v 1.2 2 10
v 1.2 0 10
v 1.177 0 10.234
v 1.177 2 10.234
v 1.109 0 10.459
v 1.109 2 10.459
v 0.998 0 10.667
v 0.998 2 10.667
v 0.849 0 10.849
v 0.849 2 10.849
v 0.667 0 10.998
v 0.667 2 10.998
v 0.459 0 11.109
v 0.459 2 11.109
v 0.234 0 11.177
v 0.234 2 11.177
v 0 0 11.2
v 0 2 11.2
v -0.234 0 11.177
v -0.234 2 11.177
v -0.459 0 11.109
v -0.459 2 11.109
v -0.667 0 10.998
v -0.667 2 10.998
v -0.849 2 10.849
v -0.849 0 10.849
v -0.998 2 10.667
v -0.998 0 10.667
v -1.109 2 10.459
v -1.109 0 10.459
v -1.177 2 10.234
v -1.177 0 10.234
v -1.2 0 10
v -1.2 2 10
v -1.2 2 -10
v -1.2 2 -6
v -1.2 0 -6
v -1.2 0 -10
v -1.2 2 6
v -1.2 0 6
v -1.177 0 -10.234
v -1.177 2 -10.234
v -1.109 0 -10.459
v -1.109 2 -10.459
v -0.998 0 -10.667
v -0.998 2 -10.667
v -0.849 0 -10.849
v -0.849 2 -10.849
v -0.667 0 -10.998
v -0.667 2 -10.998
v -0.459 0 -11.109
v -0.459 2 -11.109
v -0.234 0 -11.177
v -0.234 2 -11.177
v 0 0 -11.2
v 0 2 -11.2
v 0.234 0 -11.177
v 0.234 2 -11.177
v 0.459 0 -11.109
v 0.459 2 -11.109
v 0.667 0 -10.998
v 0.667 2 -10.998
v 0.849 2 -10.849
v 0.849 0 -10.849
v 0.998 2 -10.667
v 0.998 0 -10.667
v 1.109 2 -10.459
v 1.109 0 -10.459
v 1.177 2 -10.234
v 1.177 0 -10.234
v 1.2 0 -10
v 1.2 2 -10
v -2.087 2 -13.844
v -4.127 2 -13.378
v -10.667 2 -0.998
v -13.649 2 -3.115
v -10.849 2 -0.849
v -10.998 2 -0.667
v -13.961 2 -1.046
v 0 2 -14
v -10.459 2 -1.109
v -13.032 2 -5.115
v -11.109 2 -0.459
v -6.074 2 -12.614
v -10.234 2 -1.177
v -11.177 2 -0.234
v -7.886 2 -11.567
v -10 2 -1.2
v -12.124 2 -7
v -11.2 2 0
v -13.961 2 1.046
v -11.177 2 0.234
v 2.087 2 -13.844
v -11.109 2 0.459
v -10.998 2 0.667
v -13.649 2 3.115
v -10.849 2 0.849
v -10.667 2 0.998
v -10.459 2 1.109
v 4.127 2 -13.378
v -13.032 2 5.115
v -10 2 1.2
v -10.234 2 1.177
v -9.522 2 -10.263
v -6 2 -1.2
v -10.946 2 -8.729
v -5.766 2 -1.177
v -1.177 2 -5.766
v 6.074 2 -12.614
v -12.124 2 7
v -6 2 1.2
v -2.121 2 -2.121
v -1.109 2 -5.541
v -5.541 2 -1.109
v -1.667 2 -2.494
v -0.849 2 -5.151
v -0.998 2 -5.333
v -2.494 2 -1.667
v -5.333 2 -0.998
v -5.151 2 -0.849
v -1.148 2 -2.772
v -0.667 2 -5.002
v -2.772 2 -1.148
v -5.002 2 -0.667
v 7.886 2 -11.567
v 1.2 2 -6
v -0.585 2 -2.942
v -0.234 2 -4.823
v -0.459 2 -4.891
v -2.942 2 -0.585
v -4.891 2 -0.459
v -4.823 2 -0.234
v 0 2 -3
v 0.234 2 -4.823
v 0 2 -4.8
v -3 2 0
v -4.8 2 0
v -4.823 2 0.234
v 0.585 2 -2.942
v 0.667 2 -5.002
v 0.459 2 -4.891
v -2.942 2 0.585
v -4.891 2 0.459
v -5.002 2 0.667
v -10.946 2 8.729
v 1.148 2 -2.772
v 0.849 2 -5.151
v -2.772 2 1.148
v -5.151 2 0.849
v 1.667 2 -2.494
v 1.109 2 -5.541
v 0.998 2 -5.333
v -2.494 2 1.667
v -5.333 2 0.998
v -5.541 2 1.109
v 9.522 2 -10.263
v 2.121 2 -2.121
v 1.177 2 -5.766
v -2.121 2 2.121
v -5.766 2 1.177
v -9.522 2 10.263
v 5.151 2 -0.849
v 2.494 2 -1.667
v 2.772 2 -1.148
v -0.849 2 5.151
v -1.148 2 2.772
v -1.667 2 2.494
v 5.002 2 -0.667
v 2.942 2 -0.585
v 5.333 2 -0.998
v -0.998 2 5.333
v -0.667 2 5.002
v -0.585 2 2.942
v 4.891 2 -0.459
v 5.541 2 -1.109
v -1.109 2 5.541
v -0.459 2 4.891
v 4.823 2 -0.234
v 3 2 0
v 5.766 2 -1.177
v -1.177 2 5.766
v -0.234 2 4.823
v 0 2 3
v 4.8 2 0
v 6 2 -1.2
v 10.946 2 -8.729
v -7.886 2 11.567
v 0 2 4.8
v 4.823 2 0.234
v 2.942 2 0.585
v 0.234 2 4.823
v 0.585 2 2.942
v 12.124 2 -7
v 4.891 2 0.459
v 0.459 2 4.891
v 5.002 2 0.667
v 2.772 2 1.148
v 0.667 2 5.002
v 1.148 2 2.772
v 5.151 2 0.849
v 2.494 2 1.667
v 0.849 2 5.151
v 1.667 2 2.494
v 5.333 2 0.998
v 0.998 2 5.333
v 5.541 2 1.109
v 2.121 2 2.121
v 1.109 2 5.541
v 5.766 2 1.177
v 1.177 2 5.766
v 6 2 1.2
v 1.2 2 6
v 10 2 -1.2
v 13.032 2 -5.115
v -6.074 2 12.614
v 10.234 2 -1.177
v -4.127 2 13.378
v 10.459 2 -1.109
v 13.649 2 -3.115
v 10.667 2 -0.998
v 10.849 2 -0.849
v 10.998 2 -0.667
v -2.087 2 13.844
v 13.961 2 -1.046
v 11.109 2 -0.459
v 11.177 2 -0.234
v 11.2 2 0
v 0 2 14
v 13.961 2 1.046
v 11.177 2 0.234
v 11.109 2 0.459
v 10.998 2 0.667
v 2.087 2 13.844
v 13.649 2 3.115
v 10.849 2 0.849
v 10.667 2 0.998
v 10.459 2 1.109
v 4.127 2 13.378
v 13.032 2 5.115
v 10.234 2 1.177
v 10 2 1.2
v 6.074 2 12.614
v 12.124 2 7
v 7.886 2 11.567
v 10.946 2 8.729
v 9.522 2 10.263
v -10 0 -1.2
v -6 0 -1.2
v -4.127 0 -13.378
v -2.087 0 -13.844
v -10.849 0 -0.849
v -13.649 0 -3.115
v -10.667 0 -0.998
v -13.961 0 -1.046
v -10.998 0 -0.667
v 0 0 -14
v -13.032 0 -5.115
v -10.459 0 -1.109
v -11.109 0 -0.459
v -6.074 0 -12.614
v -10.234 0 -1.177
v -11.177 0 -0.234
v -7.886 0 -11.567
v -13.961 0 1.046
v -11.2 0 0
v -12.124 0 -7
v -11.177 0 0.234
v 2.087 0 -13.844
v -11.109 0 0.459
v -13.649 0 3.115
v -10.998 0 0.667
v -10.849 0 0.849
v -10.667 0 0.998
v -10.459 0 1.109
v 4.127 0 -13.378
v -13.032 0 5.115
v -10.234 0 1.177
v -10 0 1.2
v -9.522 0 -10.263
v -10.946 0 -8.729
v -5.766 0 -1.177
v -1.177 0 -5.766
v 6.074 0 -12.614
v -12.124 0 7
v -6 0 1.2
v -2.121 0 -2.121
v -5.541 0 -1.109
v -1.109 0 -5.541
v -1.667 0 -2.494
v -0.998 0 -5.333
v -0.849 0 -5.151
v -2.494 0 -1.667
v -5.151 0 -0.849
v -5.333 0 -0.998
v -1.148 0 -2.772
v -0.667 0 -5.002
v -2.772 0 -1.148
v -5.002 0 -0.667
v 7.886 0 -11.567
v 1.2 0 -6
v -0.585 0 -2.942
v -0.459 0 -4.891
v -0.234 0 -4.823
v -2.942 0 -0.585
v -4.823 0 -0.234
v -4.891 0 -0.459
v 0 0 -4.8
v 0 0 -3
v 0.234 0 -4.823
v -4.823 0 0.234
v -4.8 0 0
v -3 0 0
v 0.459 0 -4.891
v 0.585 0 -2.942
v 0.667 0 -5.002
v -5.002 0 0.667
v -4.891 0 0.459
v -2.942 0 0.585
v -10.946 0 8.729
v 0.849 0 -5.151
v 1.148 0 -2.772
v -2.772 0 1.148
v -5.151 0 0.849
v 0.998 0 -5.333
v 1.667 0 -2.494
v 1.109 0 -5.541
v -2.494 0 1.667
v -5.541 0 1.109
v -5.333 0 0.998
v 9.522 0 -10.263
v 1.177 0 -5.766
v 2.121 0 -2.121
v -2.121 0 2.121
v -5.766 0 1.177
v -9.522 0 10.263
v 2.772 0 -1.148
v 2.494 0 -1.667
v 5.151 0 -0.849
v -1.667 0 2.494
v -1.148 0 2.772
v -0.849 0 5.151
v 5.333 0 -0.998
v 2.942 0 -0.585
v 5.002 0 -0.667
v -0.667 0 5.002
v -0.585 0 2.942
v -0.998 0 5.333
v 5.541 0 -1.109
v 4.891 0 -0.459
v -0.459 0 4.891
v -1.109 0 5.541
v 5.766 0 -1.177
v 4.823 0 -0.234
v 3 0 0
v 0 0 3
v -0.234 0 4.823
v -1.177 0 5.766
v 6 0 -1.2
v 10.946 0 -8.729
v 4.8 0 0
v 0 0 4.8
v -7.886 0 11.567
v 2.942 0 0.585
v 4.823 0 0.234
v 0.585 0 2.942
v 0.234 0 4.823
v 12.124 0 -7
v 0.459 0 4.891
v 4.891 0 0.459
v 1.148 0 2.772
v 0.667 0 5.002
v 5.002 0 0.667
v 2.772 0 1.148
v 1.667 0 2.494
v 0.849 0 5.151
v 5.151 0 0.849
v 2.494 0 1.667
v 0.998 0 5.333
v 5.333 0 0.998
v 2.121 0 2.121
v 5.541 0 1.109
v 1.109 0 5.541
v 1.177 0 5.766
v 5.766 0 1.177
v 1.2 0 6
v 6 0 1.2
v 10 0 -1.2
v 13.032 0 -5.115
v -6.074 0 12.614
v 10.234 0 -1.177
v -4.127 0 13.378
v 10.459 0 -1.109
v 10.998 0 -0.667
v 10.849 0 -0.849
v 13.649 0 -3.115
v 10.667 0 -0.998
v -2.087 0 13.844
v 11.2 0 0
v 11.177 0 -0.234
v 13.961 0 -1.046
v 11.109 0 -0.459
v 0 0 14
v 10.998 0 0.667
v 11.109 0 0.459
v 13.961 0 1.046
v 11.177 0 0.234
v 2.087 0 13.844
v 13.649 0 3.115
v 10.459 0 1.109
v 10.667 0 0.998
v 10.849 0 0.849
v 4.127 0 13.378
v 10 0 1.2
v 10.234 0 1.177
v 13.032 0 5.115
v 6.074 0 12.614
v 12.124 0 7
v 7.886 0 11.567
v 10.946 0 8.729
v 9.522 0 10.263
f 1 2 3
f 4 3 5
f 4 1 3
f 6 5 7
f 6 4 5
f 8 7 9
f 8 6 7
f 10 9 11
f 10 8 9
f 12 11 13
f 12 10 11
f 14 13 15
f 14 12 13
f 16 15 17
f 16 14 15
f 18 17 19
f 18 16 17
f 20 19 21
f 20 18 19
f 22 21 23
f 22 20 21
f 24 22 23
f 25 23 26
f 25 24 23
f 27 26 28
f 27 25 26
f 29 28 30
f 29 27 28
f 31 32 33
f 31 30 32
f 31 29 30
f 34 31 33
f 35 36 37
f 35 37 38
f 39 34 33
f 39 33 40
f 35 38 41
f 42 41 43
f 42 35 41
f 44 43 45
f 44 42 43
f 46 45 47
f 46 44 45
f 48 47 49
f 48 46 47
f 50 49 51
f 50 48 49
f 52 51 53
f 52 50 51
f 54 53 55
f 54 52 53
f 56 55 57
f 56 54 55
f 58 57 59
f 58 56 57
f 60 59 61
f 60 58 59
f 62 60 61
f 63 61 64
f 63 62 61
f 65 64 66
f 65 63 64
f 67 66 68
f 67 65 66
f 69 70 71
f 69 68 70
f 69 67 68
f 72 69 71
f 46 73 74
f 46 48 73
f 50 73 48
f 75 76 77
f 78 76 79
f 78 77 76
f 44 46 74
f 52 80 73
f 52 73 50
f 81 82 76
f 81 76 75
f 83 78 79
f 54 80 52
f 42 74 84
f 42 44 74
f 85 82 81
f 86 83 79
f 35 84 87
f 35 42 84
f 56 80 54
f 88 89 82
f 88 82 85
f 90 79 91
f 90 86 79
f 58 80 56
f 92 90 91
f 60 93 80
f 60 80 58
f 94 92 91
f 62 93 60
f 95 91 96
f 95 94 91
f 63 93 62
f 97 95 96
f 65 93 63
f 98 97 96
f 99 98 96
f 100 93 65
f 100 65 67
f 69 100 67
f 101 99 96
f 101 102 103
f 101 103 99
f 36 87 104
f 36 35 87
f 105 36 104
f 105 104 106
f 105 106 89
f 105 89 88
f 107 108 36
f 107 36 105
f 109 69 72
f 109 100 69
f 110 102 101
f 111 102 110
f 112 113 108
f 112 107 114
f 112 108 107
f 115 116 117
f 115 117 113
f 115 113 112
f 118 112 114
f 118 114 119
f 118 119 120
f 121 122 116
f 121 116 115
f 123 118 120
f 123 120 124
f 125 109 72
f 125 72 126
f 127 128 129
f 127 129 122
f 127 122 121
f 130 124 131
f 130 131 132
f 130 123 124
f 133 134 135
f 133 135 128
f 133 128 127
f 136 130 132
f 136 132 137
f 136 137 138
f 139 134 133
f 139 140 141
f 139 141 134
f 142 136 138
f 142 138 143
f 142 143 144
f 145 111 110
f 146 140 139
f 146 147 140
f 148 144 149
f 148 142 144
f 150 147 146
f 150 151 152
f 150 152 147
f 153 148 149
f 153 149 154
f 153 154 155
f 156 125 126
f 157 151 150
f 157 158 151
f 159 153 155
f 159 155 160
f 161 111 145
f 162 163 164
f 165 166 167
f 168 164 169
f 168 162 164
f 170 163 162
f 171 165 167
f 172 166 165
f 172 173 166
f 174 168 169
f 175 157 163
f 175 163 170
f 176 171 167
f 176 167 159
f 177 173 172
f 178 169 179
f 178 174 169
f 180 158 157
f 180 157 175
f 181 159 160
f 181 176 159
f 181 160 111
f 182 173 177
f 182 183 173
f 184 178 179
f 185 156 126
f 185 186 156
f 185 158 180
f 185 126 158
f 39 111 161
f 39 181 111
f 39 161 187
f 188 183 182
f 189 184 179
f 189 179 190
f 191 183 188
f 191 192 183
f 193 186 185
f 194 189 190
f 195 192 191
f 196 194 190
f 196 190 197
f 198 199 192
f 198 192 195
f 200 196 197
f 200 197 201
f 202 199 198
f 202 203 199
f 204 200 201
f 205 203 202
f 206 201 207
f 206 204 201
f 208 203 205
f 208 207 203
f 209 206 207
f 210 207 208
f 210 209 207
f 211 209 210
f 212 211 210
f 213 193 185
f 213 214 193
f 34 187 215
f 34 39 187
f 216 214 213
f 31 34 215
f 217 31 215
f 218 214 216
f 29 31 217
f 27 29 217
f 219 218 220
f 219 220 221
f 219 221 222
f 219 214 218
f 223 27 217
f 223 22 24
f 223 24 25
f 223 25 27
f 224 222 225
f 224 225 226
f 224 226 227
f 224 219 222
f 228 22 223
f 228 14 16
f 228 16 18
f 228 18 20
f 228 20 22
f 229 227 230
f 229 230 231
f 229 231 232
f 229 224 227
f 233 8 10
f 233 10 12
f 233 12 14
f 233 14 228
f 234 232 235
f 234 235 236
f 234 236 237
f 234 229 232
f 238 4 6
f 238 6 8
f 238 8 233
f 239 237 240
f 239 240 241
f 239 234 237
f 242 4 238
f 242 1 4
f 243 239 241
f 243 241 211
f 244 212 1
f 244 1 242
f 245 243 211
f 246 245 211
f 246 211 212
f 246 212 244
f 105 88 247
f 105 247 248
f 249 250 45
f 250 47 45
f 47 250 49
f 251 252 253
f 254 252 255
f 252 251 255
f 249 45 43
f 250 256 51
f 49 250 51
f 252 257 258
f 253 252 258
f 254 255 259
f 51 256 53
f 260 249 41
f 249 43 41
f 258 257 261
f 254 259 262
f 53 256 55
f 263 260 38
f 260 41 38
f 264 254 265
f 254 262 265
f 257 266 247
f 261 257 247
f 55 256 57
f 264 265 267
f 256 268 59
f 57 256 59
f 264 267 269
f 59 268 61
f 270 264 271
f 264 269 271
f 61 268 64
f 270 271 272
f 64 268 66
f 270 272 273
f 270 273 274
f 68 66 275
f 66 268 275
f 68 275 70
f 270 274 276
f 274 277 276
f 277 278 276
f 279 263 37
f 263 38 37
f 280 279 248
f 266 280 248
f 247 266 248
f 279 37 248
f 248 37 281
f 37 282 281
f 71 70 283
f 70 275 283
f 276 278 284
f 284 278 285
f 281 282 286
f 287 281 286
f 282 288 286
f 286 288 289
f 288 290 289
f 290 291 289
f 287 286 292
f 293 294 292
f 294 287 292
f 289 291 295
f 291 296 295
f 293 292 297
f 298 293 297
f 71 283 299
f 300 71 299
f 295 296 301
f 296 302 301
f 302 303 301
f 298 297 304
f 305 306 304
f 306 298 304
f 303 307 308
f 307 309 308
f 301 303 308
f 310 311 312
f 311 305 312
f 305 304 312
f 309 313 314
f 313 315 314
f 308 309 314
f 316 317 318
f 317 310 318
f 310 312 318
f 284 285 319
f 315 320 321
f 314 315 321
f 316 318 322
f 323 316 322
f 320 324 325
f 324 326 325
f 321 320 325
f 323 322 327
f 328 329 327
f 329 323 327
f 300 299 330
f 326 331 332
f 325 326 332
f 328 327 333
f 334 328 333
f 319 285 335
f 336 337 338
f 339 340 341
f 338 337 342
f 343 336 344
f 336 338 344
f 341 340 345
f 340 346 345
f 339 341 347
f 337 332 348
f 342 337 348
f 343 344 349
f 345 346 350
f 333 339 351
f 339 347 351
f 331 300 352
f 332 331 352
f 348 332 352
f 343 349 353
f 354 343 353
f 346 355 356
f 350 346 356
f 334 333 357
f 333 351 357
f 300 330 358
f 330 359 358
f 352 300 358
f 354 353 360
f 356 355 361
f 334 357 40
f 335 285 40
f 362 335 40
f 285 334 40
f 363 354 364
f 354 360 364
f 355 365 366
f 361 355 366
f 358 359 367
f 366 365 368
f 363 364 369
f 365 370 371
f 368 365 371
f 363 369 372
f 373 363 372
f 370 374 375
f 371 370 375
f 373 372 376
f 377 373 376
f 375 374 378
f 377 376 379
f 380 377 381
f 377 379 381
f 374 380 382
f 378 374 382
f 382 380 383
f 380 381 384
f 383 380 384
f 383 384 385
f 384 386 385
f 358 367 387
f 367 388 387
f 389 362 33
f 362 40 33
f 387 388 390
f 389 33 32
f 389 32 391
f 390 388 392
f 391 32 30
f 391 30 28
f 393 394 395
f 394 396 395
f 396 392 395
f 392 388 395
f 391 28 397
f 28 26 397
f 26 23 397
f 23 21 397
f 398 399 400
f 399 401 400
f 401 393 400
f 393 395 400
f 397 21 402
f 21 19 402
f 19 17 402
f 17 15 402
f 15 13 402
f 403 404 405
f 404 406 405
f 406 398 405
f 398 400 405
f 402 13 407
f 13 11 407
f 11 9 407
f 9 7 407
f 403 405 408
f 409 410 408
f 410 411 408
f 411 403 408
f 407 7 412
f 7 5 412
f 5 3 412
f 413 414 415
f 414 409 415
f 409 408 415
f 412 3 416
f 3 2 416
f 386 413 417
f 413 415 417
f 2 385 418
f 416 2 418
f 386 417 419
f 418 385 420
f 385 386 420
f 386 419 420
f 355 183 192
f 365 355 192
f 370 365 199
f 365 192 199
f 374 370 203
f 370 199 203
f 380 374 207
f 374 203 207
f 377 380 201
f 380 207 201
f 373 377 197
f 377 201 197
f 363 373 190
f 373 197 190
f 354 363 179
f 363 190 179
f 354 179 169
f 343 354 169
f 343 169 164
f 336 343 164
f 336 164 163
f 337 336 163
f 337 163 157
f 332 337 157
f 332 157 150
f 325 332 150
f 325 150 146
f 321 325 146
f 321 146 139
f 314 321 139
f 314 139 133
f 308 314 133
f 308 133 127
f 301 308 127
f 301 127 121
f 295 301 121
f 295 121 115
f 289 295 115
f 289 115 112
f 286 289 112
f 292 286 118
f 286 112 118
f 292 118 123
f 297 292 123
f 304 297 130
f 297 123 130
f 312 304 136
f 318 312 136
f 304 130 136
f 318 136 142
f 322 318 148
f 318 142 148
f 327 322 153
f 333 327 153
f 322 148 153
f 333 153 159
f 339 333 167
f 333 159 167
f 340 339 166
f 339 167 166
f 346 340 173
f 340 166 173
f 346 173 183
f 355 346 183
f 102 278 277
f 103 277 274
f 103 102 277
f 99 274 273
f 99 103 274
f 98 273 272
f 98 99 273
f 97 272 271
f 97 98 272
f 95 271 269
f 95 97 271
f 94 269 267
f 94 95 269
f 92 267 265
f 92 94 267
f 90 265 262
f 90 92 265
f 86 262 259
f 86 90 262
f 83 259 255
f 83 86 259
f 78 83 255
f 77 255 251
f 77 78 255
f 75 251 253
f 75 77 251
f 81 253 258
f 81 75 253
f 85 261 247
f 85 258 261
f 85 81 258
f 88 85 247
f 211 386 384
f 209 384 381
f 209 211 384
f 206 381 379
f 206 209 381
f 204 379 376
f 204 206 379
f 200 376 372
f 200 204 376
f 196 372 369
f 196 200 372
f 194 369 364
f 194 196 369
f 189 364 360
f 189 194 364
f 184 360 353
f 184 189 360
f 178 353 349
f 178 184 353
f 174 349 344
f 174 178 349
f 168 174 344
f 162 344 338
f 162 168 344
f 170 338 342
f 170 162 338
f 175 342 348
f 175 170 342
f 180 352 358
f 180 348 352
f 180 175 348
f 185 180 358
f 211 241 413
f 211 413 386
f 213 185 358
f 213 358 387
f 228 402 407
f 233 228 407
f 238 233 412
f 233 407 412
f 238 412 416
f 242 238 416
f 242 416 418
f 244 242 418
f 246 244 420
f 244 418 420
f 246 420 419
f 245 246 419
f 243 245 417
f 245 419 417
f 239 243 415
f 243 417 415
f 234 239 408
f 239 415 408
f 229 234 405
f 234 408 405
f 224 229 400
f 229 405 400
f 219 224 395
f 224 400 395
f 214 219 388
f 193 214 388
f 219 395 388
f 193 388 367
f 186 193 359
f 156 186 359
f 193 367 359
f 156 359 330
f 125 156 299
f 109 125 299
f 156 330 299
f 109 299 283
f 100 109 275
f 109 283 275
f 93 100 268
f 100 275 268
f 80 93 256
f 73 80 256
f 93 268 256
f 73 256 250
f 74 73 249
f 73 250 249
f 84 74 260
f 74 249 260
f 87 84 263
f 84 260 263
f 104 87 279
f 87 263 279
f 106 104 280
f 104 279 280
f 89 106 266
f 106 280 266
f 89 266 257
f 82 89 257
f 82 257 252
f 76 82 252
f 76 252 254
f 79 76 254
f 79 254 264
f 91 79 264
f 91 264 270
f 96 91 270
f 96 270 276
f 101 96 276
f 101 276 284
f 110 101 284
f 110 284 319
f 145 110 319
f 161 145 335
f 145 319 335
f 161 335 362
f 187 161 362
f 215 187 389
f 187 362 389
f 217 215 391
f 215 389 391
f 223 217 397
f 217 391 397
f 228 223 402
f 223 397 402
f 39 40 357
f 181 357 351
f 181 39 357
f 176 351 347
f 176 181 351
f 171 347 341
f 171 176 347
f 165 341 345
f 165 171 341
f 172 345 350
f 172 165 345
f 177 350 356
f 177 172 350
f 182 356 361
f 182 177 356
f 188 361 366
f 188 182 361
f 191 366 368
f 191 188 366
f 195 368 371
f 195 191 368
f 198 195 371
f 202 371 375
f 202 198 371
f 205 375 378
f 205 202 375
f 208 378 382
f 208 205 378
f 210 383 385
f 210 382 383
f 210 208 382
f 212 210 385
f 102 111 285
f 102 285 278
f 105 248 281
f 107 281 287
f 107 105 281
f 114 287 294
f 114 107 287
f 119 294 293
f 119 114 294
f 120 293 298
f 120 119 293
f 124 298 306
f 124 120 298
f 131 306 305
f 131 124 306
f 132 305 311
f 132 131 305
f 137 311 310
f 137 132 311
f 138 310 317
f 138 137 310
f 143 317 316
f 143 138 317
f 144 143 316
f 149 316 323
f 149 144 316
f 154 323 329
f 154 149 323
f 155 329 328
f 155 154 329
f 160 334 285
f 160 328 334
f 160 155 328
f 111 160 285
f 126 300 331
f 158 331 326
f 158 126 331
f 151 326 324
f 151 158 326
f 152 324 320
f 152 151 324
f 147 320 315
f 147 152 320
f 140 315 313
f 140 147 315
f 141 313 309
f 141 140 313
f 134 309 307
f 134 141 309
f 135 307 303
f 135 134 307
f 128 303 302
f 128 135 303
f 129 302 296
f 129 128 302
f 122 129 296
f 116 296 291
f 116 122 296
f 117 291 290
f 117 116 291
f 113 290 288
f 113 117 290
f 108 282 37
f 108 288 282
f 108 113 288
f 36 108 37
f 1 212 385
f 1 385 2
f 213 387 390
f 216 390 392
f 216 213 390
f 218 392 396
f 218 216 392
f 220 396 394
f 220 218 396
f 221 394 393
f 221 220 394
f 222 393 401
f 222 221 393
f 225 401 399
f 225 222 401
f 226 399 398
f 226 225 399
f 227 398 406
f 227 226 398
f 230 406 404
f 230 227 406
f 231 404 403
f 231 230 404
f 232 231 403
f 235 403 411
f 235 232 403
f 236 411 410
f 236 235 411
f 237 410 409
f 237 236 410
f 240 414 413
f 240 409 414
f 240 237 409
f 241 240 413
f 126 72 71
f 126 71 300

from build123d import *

# Parameters (mm, degrees)
SKETCH1_R           = 14
BOSS_EXTRUDE1_DEPTH = 2
SKETCH2_R           = 3
CUT_EXTRUDE1_DEPTH  = 20.899748742


with BuildPart() as part:
    # Sketch1 → Boss-Extrude1 (new body)
    with BuildSketch(Plane(origin=(0, 0, 0), x_dir=(1, 0, 0), z_dir=(0, 1, 0))):
        with Locations(Location((0, 0, 0), (0, 0, 270))):
            Circle(SKETCH1_R)
    extrude(amount=BOSS_EXTRUDE1_DEPTH)

    # Sketch2 → Cut-Extrude1 (cut, through all)
    with BuildSketch(Plane(origin=(0, 2, 0), x_dir=(1, 0, 0), z_dir=(0, 1, 0))):
        with Locations(Location((0, 0, 0), (0, 0, 270))):
            Circle(SKETCH2_R)
        with BuildLine():
            Line((1.2, 10), (1.2, 6))
            ThreePointArc((1.2, 6), (0, 4.8), (-1.2, 6))
            Line((-1.2, 6), (-1.2, 10))
            ThreePointArc((-1.2, 10), (0, 11.2), (1.2, 10))
        make_face()
        with BuildLine():
            Line((10, -1.2), (6, -1.2))
            ThreePointArc((6, -1.2), (4.8, 0), (6, 1.2))
            Line((6, 1.2), (10, 1.2))
            ThreePointArc((10, 1.2), (11.2, 0), (10, -1.2))
        make_face()
        with BuildLine():
            Line((-1.2, -10), (-1.2, -6))
            ThreePointArc((-1.2, -6), (0, -4.8), (1.2, -6))
            Line((1.2, -6), (1.2, -10))
            ThreePointArc((1.2, -10), (0, -11.2), (-1.2, -10))
        make_face()
        with BuildLine():
            Line((-10, 1.2), (-6, 1.2))
            ThreePointArc((-6, 1.2), (-4.8, 0), (-6, -1.2))
            Line((-6, -1.2), (-10, -1.2))
            ThreePointArc((-10, -1.2), (-11.2, 0), (-10, 1.2))
        make_face()
    extrude(amount=-CUT_EXTRUDE1_DEPTH, mode=Mode.SUBTRACT)


solid = part.part
